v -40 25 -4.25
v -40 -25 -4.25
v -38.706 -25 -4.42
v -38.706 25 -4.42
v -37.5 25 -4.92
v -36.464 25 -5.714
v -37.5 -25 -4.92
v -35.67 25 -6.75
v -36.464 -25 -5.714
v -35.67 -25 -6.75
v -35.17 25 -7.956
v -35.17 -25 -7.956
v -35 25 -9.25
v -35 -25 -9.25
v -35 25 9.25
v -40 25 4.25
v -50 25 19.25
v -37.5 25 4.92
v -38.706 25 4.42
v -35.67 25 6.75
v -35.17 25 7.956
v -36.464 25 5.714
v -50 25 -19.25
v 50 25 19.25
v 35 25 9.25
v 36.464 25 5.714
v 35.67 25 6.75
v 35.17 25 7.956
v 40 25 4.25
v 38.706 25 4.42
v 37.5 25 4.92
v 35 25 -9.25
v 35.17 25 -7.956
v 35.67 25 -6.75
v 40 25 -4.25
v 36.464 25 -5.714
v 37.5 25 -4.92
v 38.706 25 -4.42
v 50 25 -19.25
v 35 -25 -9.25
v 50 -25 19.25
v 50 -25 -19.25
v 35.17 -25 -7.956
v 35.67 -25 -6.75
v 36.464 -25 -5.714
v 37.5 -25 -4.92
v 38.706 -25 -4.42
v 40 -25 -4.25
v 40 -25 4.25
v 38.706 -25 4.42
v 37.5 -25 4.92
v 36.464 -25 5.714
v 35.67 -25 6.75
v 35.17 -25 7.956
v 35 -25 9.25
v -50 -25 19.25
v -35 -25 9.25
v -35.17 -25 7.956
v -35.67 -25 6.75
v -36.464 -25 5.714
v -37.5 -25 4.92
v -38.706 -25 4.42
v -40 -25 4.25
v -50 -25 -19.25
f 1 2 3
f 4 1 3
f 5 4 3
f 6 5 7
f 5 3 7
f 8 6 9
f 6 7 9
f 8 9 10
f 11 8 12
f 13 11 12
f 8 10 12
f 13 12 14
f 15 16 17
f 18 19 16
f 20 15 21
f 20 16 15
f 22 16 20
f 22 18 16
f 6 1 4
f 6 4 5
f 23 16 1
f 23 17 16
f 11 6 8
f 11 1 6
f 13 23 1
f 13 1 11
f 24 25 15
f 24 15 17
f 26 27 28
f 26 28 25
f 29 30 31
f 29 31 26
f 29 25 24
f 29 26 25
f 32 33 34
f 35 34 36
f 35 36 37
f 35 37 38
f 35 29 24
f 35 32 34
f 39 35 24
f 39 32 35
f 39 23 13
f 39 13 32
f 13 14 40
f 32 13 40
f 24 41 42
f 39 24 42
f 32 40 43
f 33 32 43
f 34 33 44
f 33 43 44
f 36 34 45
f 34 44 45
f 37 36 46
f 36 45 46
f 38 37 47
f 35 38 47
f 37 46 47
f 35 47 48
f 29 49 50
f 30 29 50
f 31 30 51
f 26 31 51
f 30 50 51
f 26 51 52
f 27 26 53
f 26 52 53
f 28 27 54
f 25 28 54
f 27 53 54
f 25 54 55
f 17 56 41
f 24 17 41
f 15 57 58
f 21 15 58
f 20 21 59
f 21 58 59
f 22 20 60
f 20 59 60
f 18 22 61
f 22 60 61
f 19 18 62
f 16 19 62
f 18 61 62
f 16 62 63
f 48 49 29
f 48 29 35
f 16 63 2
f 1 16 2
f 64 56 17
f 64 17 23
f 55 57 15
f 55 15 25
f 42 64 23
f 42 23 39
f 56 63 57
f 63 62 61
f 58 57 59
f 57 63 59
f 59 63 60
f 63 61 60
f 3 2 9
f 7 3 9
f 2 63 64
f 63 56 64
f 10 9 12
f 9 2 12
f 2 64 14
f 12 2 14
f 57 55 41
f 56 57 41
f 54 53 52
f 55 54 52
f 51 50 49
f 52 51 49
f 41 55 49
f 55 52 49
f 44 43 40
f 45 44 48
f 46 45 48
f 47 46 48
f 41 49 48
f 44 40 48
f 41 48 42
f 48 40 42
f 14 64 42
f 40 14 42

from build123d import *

# Parameters (mm, degrees)
BOSS_EXTRUDE1_DEPTH      = 25
BOSS_EXTRUDE1_DEPTH_BACK = 25
SKETCH1_W                = 100
SKETCH1_H                = 38.5
SKETCH1_W_2              = 80
SKETCH1_H_2              = 18.5
BOSS_EXTRUDE2_DEPTH      = 25
BOSS_EXTRUDE2_DEPTH_BACK = 25
SKETCH2_R                = 5


with BuildPart() as part:
    # Sketch1 → Boss-Extrude1 (new, two sides: drawn at the far end of the back side and taken through both)
    with BuildSketch(Plane(origin=(0, 0, 0), x_dir=(1, 0, 0), z_dir=(0, 1, 0)).offset(-BOSS_EXTRUDE1_DEPTH_BACK)):
        Rectangle(SKETCH1_W, SKETCH1_H)
        Rectangle(SKETCH1_W_2, SKETCH1_H_2, mode=Mode.SUBTRACT)
    extrude(amount=BOSS_EXTRUDE1_DEPTH + BOSS_EXTRUDE1_DEPTH_BACK)

    # Sketch2 → Boss-Extrude2 (add, two sides: drawn at the far end of the back side and taken through both)
    with BuildSketch(Plane(origin=(0, 0, 0), x_dir=(1, 0, 0), z_dir=(0, 1, 0)).offset(-BOSS_EXTRUDE2_DEPTH_BACK)):
        with Locations((40, 9.25)):
            Circle(SKETCH2_R)
        with Locations((40, -9.25)):
            Circle(SKETCH2_R)
        with Locations((-40, 9.25)):
            Circle(SKETCH2_R)
        with Locations((-40, -9.25)):
            Circle(SKETCH2_R)
    extrude(amount=BOSS_EXTRUDE2_DEPTH + BOSS_EXTRUDE2_DEPTH_BACK)


solid = part.part
